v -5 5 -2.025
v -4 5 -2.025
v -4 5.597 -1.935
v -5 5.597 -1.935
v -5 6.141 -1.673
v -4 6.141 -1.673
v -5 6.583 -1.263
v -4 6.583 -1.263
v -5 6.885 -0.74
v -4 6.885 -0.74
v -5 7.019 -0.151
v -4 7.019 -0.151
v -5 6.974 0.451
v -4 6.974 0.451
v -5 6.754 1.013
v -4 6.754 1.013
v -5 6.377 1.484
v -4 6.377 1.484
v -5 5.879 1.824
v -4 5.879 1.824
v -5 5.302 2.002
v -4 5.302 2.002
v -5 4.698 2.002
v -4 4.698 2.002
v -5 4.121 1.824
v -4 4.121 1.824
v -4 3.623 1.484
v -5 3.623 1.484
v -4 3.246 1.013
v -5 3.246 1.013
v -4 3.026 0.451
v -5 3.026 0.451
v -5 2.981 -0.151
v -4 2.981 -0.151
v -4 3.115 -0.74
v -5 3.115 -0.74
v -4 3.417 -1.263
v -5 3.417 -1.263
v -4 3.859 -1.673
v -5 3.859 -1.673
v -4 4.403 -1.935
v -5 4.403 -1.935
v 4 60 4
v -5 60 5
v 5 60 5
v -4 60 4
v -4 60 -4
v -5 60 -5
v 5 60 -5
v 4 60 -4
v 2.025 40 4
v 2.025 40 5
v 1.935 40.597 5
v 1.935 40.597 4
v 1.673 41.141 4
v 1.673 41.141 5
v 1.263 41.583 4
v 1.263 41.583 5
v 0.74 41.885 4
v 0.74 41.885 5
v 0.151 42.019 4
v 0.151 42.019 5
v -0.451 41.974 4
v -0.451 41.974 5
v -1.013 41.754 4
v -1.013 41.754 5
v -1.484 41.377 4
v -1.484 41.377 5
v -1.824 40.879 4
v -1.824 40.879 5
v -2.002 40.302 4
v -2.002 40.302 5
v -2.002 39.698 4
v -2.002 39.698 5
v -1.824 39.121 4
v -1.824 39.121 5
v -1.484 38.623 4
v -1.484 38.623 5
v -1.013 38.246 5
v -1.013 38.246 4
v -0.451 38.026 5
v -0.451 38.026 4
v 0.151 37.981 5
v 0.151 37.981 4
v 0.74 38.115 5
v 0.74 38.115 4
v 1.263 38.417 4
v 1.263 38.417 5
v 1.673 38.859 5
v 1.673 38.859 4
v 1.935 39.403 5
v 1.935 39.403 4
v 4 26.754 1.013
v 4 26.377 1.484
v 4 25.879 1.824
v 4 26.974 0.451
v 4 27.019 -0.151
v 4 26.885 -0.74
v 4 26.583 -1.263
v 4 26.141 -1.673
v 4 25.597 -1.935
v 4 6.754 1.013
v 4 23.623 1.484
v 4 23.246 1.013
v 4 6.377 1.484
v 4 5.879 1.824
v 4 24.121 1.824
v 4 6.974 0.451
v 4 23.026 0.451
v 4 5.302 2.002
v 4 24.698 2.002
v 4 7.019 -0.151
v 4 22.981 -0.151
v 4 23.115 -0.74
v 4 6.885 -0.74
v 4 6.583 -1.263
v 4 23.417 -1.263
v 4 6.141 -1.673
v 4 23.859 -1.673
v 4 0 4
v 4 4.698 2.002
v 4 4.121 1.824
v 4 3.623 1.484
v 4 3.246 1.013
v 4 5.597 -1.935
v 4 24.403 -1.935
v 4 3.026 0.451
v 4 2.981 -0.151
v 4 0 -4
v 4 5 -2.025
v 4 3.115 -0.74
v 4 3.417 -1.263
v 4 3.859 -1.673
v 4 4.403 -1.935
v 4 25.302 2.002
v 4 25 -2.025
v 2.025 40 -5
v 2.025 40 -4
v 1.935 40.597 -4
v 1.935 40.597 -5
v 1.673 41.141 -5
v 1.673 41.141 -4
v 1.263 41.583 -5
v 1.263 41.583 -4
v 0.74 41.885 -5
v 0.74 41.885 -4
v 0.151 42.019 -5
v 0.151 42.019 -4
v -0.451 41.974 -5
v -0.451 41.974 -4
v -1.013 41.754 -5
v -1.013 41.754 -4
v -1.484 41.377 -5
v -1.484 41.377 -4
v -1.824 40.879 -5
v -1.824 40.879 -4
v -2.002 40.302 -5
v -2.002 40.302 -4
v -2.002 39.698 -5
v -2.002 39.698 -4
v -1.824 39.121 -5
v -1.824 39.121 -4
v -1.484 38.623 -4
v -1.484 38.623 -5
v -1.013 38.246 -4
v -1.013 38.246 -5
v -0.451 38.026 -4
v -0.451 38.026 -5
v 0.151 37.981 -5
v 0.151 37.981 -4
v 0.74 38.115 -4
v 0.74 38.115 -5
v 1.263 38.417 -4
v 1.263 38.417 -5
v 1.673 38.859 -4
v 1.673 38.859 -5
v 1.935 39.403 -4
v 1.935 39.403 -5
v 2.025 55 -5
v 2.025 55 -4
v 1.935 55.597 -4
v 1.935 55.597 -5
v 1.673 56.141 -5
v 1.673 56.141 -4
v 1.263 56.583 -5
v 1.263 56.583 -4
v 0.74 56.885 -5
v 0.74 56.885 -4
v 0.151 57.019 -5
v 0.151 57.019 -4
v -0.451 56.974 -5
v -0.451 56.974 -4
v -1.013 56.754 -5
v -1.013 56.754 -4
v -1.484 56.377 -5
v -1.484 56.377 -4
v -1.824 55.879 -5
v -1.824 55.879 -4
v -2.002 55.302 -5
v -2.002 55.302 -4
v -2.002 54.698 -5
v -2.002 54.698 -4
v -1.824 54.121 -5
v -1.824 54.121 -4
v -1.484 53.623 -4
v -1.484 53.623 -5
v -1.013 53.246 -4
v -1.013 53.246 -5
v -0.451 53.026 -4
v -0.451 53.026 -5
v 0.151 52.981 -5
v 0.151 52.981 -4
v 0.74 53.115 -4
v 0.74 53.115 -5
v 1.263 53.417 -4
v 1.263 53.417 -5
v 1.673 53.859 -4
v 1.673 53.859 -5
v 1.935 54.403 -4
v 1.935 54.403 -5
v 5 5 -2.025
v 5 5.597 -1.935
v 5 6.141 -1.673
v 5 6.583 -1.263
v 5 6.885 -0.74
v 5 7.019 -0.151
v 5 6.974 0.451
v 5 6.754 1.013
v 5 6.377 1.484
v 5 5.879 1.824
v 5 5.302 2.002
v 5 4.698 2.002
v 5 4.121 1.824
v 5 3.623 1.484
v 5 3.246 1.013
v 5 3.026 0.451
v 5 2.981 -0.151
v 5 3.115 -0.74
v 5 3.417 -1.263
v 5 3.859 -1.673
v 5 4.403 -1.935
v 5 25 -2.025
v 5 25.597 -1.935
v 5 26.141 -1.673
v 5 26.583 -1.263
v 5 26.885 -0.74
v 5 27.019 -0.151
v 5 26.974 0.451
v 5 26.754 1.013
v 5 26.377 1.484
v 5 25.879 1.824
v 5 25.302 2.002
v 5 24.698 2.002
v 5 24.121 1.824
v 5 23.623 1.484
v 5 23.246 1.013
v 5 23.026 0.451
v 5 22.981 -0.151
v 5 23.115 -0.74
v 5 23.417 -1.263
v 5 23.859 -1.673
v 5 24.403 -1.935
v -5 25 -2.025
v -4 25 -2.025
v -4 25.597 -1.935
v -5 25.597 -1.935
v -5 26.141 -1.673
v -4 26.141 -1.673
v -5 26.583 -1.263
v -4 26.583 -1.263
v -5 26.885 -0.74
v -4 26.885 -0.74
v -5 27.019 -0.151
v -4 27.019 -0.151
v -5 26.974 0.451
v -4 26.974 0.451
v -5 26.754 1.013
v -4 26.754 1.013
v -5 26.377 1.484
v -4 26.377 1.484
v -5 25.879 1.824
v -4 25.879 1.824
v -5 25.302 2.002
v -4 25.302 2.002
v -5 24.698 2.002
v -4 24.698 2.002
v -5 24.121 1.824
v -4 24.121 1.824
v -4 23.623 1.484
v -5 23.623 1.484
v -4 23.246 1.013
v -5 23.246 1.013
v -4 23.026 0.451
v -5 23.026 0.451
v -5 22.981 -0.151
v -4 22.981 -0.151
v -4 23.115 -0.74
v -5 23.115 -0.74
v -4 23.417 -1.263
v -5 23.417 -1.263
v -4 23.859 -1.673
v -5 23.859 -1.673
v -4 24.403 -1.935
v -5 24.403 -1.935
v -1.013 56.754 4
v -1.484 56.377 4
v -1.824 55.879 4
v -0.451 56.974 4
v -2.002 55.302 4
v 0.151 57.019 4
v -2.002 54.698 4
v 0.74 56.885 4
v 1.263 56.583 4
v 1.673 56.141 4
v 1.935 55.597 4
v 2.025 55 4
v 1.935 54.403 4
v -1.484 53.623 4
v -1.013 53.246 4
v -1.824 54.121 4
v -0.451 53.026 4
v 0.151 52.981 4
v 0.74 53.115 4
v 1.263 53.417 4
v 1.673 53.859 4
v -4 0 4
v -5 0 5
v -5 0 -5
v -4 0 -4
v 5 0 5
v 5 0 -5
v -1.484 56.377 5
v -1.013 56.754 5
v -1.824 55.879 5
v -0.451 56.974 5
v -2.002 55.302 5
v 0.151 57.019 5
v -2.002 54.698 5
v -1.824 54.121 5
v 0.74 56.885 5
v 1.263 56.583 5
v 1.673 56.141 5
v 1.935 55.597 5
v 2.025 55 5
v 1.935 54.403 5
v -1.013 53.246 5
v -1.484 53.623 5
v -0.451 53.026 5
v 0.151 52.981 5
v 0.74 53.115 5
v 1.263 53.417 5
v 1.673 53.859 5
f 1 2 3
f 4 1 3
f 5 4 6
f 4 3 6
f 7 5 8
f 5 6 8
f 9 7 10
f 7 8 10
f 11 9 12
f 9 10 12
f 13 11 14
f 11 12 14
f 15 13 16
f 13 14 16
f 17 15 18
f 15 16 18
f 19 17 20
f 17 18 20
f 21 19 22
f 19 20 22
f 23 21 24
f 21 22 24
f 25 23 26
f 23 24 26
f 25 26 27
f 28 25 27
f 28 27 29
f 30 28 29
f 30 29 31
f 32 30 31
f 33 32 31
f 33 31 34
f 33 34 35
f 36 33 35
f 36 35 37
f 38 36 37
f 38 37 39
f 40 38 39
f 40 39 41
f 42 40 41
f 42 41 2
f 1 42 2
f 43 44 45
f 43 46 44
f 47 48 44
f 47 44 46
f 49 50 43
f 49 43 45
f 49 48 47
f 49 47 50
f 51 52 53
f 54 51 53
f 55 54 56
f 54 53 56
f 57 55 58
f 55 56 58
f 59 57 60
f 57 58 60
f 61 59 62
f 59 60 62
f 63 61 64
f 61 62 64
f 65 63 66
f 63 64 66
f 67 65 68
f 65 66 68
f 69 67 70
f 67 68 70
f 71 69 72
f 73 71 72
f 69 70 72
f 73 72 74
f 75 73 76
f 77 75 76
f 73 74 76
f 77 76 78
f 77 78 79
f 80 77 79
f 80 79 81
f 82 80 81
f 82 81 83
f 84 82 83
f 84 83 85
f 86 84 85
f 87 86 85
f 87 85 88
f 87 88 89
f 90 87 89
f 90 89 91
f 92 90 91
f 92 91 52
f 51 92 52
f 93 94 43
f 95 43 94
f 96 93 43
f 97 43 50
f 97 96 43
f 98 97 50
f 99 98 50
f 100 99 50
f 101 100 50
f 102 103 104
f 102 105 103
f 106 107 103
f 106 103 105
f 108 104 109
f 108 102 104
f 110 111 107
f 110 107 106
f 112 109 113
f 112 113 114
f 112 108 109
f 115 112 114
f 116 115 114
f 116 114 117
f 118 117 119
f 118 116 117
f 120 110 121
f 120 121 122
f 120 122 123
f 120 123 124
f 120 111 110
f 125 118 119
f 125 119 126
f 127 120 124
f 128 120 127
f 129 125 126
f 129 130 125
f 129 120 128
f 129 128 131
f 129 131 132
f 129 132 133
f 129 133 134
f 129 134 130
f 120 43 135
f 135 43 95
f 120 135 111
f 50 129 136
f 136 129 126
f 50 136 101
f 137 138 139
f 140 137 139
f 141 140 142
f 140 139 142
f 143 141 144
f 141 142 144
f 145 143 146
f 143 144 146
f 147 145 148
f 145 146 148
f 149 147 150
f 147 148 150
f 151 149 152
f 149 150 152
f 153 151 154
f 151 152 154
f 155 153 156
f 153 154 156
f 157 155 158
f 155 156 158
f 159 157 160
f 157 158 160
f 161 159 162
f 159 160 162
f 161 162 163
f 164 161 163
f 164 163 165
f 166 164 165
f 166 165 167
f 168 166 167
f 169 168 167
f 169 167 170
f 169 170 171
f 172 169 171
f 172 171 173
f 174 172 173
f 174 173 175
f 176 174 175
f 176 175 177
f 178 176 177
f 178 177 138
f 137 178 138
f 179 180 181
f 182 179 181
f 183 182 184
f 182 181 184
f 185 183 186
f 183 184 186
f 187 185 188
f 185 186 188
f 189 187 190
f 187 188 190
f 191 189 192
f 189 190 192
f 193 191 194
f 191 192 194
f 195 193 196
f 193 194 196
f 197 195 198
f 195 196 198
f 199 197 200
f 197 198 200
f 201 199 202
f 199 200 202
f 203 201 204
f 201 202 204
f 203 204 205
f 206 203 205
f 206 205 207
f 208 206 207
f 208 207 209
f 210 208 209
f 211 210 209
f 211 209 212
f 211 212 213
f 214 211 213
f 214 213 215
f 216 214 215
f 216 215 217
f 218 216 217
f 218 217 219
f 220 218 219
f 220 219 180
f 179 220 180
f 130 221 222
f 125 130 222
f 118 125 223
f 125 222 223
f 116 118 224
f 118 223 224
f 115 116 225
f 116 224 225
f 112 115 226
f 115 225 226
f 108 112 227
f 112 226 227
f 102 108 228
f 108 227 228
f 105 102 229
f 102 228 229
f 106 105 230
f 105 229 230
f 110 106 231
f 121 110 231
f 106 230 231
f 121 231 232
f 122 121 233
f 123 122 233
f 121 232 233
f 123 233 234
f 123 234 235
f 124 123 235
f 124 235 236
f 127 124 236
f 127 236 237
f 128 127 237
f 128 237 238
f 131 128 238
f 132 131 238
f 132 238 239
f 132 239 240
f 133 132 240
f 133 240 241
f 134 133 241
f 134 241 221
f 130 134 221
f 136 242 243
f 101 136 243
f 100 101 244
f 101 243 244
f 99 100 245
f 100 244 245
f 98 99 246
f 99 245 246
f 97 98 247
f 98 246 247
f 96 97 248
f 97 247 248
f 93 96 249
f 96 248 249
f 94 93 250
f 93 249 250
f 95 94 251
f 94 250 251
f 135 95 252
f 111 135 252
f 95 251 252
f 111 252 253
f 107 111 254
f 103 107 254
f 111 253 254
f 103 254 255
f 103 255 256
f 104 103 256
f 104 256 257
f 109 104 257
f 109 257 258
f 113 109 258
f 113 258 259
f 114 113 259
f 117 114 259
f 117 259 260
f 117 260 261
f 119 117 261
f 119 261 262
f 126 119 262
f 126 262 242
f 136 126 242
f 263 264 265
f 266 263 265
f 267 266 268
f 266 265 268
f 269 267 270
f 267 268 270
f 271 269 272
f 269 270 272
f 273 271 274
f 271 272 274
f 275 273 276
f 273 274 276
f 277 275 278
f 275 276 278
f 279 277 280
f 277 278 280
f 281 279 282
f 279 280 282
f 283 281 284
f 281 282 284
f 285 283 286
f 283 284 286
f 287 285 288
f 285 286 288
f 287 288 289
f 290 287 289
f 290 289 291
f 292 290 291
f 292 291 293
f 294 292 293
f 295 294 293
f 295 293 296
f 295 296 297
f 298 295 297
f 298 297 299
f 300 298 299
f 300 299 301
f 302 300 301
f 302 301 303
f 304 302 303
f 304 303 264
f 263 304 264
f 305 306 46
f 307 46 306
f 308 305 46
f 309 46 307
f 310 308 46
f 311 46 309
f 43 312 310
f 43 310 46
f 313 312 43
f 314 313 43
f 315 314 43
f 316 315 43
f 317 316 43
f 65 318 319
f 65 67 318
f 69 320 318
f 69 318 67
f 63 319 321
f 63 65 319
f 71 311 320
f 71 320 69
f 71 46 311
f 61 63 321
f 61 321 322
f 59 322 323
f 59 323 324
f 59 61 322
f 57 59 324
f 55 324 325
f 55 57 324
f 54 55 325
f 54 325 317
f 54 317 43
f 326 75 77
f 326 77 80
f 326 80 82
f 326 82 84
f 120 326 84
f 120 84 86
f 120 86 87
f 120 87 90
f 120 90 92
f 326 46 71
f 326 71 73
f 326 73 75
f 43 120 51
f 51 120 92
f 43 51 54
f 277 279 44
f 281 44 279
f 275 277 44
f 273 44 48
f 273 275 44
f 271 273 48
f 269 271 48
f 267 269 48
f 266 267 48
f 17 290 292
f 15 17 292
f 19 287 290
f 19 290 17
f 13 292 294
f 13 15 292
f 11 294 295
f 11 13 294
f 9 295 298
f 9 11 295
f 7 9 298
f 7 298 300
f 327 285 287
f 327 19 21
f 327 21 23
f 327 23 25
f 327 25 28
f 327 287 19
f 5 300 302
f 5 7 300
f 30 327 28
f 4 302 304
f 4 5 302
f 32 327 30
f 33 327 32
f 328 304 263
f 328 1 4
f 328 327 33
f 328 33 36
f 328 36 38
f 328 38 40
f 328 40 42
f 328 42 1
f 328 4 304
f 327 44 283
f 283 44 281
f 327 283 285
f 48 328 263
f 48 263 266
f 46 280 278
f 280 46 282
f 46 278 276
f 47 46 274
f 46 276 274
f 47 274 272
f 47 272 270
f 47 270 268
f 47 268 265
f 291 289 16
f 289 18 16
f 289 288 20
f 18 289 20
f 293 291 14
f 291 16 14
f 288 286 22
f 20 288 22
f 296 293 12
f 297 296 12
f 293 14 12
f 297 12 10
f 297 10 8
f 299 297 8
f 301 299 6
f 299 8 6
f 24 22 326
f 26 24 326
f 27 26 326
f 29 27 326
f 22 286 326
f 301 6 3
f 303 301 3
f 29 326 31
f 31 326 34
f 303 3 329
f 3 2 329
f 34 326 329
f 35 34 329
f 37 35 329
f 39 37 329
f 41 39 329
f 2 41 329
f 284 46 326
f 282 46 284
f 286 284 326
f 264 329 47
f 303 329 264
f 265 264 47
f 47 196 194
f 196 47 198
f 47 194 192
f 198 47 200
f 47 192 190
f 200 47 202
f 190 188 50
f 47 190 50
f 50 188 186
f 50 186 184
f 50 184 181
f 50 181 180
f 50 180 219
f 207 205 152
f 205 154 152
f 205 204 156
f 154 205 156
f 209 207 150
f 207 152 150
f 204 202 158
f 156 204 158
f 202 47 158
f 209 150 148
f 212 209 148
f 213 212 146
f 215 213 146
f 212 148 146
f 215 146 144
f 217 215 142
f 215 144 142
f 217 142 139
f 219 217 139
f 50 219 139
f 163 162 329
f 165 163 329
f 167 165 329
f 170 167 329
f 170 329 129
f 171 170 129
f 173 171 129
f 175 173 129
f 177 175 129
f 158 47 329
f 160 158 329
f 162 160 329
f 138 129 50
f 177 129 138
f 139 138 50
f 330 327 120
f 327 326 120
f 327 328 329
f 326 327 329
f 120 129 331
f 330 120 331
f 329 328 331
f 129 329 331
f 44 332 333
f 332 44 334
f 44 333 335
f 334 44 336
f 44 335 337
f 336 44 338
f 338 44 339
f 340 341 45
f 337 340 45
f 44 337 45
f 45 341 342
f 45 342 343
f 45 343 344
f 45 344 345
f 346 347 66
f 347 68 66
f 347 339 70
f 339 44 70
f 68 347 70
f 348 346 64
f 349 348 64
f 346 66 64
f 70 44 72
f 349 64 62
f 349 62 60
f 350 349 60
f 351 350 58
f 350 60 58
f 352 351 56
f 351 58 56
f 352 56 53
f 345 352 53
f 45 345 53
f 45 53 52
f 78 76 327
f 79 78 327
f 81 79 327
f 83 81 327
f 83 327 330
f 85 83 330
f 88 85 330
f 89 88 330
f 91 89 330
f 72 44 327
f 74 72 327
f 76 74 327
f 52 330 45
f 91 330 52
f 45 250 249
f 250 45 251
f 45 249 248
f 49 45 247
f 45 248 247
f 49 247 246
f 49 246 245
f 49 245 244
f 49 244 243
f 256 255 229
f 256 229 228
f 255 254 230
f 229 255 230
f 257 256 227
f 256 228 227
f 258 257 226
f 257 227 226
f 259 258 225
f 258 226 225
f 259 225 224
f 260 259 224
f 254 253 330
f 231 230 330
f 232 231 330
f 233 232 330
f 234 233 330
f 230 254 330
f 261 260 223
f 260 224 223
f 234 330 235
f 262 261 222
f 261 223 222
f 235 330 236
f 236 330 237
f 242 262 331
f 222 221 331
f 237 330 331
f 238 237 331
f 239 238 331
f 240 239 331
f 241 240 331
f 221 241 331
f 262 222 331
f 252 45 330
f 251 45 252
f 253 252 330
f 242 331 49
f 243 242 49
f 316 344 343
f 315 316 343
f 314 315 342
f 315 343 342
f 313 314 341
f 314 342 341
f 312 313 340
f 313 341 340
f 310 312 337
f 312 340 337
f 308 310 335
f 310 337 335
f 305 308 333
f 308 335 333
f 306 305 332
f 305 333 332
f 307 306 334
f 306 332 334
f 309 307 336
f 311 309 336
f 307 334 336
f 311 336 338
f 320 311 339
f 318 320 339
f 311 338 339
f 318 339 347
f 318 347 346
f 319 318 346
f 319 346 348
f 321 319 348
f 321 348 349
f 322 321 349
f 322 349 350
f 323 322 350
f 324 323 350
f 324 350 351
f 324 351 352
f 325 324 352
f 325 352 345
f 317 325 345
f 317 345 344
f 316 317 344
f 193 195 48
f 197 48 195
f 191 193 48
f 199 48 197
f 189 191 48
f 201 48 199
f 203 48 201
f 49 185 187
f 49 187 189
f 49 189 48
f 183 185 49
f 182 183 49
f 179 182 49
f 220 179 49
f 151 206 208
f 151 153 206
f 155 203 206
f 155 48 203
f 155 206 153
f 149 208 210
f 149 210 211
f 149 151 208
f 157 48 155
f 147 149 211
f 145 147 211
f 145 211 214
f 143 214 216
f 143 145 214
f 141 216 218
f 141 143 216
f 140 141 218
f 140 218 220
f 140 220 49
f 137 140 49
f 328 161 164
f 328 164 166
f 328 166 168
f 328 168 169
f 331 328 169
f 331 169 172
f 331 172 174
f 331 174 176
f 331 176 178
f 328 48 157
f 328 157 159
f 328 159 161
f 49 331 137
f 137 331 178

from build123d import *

# Parameters (mm, degrees)
SKETCH1_W           = 10
SKETCH1_H           = 10
SKETCH1_W_2         = 8
SKETCH1_H_2         = 8
BOSS_EXTRUDE1_DEPTH = 60
SKETCH2_R           = 2.025
CUT_EXTRUDE1_DEPTH  = 62.032778079
SKETCH4_R           = 2.025
CUT_EXTRUDE2_DEPTH  = 62.032778079


with BuildPart() as part:
    # Sketch1 → Boss-Extrude1 (new body)
    with BuildSketch(Plane(origin=(0, 0, 0), x_dir=(1, 0, 0), z_dir=(0, 1, 0))):
        Rectangle(SKETCH1_W, SKETCH1_H)
        Rectangle(SKETCH1_W_2, SKETCH1_H_2, mode=Mode.SUBTRACT)
    extrude(amount=BOSS_EXTRUDE1_DEPTH)

    # Sketch2 → Cut-Extrude1 (cut, through all)
    with BuildSketch(Plane(origin=(5, 0, 0), x_dir=(0, 0, -1), z_dir=(1, 0, 0))):
        with Locations((0, 5)):
            Circle(SKETCH2_R)
        with Locations((0, 25)):
            Circle(SKETCH2_R)
    extrude(amount=-CUT_EXTRUDE1_DEPTH, mode=Mode.SUBTRACT)

    # Sketch4 → Cut-Extrude2 (cut, through all)
    with BuildSketch(Plane.XY.offset(5)):
        with Locations((0, 55)):
            Circle(SKETCH4_R)
        with Locations((0, 40)):
            Circle(SKETCH4_R)
    extrude(amount=-CUT_EXTRUDE2_DEPTH, mode=Mode.SUBTRACT)


solid = part.part
